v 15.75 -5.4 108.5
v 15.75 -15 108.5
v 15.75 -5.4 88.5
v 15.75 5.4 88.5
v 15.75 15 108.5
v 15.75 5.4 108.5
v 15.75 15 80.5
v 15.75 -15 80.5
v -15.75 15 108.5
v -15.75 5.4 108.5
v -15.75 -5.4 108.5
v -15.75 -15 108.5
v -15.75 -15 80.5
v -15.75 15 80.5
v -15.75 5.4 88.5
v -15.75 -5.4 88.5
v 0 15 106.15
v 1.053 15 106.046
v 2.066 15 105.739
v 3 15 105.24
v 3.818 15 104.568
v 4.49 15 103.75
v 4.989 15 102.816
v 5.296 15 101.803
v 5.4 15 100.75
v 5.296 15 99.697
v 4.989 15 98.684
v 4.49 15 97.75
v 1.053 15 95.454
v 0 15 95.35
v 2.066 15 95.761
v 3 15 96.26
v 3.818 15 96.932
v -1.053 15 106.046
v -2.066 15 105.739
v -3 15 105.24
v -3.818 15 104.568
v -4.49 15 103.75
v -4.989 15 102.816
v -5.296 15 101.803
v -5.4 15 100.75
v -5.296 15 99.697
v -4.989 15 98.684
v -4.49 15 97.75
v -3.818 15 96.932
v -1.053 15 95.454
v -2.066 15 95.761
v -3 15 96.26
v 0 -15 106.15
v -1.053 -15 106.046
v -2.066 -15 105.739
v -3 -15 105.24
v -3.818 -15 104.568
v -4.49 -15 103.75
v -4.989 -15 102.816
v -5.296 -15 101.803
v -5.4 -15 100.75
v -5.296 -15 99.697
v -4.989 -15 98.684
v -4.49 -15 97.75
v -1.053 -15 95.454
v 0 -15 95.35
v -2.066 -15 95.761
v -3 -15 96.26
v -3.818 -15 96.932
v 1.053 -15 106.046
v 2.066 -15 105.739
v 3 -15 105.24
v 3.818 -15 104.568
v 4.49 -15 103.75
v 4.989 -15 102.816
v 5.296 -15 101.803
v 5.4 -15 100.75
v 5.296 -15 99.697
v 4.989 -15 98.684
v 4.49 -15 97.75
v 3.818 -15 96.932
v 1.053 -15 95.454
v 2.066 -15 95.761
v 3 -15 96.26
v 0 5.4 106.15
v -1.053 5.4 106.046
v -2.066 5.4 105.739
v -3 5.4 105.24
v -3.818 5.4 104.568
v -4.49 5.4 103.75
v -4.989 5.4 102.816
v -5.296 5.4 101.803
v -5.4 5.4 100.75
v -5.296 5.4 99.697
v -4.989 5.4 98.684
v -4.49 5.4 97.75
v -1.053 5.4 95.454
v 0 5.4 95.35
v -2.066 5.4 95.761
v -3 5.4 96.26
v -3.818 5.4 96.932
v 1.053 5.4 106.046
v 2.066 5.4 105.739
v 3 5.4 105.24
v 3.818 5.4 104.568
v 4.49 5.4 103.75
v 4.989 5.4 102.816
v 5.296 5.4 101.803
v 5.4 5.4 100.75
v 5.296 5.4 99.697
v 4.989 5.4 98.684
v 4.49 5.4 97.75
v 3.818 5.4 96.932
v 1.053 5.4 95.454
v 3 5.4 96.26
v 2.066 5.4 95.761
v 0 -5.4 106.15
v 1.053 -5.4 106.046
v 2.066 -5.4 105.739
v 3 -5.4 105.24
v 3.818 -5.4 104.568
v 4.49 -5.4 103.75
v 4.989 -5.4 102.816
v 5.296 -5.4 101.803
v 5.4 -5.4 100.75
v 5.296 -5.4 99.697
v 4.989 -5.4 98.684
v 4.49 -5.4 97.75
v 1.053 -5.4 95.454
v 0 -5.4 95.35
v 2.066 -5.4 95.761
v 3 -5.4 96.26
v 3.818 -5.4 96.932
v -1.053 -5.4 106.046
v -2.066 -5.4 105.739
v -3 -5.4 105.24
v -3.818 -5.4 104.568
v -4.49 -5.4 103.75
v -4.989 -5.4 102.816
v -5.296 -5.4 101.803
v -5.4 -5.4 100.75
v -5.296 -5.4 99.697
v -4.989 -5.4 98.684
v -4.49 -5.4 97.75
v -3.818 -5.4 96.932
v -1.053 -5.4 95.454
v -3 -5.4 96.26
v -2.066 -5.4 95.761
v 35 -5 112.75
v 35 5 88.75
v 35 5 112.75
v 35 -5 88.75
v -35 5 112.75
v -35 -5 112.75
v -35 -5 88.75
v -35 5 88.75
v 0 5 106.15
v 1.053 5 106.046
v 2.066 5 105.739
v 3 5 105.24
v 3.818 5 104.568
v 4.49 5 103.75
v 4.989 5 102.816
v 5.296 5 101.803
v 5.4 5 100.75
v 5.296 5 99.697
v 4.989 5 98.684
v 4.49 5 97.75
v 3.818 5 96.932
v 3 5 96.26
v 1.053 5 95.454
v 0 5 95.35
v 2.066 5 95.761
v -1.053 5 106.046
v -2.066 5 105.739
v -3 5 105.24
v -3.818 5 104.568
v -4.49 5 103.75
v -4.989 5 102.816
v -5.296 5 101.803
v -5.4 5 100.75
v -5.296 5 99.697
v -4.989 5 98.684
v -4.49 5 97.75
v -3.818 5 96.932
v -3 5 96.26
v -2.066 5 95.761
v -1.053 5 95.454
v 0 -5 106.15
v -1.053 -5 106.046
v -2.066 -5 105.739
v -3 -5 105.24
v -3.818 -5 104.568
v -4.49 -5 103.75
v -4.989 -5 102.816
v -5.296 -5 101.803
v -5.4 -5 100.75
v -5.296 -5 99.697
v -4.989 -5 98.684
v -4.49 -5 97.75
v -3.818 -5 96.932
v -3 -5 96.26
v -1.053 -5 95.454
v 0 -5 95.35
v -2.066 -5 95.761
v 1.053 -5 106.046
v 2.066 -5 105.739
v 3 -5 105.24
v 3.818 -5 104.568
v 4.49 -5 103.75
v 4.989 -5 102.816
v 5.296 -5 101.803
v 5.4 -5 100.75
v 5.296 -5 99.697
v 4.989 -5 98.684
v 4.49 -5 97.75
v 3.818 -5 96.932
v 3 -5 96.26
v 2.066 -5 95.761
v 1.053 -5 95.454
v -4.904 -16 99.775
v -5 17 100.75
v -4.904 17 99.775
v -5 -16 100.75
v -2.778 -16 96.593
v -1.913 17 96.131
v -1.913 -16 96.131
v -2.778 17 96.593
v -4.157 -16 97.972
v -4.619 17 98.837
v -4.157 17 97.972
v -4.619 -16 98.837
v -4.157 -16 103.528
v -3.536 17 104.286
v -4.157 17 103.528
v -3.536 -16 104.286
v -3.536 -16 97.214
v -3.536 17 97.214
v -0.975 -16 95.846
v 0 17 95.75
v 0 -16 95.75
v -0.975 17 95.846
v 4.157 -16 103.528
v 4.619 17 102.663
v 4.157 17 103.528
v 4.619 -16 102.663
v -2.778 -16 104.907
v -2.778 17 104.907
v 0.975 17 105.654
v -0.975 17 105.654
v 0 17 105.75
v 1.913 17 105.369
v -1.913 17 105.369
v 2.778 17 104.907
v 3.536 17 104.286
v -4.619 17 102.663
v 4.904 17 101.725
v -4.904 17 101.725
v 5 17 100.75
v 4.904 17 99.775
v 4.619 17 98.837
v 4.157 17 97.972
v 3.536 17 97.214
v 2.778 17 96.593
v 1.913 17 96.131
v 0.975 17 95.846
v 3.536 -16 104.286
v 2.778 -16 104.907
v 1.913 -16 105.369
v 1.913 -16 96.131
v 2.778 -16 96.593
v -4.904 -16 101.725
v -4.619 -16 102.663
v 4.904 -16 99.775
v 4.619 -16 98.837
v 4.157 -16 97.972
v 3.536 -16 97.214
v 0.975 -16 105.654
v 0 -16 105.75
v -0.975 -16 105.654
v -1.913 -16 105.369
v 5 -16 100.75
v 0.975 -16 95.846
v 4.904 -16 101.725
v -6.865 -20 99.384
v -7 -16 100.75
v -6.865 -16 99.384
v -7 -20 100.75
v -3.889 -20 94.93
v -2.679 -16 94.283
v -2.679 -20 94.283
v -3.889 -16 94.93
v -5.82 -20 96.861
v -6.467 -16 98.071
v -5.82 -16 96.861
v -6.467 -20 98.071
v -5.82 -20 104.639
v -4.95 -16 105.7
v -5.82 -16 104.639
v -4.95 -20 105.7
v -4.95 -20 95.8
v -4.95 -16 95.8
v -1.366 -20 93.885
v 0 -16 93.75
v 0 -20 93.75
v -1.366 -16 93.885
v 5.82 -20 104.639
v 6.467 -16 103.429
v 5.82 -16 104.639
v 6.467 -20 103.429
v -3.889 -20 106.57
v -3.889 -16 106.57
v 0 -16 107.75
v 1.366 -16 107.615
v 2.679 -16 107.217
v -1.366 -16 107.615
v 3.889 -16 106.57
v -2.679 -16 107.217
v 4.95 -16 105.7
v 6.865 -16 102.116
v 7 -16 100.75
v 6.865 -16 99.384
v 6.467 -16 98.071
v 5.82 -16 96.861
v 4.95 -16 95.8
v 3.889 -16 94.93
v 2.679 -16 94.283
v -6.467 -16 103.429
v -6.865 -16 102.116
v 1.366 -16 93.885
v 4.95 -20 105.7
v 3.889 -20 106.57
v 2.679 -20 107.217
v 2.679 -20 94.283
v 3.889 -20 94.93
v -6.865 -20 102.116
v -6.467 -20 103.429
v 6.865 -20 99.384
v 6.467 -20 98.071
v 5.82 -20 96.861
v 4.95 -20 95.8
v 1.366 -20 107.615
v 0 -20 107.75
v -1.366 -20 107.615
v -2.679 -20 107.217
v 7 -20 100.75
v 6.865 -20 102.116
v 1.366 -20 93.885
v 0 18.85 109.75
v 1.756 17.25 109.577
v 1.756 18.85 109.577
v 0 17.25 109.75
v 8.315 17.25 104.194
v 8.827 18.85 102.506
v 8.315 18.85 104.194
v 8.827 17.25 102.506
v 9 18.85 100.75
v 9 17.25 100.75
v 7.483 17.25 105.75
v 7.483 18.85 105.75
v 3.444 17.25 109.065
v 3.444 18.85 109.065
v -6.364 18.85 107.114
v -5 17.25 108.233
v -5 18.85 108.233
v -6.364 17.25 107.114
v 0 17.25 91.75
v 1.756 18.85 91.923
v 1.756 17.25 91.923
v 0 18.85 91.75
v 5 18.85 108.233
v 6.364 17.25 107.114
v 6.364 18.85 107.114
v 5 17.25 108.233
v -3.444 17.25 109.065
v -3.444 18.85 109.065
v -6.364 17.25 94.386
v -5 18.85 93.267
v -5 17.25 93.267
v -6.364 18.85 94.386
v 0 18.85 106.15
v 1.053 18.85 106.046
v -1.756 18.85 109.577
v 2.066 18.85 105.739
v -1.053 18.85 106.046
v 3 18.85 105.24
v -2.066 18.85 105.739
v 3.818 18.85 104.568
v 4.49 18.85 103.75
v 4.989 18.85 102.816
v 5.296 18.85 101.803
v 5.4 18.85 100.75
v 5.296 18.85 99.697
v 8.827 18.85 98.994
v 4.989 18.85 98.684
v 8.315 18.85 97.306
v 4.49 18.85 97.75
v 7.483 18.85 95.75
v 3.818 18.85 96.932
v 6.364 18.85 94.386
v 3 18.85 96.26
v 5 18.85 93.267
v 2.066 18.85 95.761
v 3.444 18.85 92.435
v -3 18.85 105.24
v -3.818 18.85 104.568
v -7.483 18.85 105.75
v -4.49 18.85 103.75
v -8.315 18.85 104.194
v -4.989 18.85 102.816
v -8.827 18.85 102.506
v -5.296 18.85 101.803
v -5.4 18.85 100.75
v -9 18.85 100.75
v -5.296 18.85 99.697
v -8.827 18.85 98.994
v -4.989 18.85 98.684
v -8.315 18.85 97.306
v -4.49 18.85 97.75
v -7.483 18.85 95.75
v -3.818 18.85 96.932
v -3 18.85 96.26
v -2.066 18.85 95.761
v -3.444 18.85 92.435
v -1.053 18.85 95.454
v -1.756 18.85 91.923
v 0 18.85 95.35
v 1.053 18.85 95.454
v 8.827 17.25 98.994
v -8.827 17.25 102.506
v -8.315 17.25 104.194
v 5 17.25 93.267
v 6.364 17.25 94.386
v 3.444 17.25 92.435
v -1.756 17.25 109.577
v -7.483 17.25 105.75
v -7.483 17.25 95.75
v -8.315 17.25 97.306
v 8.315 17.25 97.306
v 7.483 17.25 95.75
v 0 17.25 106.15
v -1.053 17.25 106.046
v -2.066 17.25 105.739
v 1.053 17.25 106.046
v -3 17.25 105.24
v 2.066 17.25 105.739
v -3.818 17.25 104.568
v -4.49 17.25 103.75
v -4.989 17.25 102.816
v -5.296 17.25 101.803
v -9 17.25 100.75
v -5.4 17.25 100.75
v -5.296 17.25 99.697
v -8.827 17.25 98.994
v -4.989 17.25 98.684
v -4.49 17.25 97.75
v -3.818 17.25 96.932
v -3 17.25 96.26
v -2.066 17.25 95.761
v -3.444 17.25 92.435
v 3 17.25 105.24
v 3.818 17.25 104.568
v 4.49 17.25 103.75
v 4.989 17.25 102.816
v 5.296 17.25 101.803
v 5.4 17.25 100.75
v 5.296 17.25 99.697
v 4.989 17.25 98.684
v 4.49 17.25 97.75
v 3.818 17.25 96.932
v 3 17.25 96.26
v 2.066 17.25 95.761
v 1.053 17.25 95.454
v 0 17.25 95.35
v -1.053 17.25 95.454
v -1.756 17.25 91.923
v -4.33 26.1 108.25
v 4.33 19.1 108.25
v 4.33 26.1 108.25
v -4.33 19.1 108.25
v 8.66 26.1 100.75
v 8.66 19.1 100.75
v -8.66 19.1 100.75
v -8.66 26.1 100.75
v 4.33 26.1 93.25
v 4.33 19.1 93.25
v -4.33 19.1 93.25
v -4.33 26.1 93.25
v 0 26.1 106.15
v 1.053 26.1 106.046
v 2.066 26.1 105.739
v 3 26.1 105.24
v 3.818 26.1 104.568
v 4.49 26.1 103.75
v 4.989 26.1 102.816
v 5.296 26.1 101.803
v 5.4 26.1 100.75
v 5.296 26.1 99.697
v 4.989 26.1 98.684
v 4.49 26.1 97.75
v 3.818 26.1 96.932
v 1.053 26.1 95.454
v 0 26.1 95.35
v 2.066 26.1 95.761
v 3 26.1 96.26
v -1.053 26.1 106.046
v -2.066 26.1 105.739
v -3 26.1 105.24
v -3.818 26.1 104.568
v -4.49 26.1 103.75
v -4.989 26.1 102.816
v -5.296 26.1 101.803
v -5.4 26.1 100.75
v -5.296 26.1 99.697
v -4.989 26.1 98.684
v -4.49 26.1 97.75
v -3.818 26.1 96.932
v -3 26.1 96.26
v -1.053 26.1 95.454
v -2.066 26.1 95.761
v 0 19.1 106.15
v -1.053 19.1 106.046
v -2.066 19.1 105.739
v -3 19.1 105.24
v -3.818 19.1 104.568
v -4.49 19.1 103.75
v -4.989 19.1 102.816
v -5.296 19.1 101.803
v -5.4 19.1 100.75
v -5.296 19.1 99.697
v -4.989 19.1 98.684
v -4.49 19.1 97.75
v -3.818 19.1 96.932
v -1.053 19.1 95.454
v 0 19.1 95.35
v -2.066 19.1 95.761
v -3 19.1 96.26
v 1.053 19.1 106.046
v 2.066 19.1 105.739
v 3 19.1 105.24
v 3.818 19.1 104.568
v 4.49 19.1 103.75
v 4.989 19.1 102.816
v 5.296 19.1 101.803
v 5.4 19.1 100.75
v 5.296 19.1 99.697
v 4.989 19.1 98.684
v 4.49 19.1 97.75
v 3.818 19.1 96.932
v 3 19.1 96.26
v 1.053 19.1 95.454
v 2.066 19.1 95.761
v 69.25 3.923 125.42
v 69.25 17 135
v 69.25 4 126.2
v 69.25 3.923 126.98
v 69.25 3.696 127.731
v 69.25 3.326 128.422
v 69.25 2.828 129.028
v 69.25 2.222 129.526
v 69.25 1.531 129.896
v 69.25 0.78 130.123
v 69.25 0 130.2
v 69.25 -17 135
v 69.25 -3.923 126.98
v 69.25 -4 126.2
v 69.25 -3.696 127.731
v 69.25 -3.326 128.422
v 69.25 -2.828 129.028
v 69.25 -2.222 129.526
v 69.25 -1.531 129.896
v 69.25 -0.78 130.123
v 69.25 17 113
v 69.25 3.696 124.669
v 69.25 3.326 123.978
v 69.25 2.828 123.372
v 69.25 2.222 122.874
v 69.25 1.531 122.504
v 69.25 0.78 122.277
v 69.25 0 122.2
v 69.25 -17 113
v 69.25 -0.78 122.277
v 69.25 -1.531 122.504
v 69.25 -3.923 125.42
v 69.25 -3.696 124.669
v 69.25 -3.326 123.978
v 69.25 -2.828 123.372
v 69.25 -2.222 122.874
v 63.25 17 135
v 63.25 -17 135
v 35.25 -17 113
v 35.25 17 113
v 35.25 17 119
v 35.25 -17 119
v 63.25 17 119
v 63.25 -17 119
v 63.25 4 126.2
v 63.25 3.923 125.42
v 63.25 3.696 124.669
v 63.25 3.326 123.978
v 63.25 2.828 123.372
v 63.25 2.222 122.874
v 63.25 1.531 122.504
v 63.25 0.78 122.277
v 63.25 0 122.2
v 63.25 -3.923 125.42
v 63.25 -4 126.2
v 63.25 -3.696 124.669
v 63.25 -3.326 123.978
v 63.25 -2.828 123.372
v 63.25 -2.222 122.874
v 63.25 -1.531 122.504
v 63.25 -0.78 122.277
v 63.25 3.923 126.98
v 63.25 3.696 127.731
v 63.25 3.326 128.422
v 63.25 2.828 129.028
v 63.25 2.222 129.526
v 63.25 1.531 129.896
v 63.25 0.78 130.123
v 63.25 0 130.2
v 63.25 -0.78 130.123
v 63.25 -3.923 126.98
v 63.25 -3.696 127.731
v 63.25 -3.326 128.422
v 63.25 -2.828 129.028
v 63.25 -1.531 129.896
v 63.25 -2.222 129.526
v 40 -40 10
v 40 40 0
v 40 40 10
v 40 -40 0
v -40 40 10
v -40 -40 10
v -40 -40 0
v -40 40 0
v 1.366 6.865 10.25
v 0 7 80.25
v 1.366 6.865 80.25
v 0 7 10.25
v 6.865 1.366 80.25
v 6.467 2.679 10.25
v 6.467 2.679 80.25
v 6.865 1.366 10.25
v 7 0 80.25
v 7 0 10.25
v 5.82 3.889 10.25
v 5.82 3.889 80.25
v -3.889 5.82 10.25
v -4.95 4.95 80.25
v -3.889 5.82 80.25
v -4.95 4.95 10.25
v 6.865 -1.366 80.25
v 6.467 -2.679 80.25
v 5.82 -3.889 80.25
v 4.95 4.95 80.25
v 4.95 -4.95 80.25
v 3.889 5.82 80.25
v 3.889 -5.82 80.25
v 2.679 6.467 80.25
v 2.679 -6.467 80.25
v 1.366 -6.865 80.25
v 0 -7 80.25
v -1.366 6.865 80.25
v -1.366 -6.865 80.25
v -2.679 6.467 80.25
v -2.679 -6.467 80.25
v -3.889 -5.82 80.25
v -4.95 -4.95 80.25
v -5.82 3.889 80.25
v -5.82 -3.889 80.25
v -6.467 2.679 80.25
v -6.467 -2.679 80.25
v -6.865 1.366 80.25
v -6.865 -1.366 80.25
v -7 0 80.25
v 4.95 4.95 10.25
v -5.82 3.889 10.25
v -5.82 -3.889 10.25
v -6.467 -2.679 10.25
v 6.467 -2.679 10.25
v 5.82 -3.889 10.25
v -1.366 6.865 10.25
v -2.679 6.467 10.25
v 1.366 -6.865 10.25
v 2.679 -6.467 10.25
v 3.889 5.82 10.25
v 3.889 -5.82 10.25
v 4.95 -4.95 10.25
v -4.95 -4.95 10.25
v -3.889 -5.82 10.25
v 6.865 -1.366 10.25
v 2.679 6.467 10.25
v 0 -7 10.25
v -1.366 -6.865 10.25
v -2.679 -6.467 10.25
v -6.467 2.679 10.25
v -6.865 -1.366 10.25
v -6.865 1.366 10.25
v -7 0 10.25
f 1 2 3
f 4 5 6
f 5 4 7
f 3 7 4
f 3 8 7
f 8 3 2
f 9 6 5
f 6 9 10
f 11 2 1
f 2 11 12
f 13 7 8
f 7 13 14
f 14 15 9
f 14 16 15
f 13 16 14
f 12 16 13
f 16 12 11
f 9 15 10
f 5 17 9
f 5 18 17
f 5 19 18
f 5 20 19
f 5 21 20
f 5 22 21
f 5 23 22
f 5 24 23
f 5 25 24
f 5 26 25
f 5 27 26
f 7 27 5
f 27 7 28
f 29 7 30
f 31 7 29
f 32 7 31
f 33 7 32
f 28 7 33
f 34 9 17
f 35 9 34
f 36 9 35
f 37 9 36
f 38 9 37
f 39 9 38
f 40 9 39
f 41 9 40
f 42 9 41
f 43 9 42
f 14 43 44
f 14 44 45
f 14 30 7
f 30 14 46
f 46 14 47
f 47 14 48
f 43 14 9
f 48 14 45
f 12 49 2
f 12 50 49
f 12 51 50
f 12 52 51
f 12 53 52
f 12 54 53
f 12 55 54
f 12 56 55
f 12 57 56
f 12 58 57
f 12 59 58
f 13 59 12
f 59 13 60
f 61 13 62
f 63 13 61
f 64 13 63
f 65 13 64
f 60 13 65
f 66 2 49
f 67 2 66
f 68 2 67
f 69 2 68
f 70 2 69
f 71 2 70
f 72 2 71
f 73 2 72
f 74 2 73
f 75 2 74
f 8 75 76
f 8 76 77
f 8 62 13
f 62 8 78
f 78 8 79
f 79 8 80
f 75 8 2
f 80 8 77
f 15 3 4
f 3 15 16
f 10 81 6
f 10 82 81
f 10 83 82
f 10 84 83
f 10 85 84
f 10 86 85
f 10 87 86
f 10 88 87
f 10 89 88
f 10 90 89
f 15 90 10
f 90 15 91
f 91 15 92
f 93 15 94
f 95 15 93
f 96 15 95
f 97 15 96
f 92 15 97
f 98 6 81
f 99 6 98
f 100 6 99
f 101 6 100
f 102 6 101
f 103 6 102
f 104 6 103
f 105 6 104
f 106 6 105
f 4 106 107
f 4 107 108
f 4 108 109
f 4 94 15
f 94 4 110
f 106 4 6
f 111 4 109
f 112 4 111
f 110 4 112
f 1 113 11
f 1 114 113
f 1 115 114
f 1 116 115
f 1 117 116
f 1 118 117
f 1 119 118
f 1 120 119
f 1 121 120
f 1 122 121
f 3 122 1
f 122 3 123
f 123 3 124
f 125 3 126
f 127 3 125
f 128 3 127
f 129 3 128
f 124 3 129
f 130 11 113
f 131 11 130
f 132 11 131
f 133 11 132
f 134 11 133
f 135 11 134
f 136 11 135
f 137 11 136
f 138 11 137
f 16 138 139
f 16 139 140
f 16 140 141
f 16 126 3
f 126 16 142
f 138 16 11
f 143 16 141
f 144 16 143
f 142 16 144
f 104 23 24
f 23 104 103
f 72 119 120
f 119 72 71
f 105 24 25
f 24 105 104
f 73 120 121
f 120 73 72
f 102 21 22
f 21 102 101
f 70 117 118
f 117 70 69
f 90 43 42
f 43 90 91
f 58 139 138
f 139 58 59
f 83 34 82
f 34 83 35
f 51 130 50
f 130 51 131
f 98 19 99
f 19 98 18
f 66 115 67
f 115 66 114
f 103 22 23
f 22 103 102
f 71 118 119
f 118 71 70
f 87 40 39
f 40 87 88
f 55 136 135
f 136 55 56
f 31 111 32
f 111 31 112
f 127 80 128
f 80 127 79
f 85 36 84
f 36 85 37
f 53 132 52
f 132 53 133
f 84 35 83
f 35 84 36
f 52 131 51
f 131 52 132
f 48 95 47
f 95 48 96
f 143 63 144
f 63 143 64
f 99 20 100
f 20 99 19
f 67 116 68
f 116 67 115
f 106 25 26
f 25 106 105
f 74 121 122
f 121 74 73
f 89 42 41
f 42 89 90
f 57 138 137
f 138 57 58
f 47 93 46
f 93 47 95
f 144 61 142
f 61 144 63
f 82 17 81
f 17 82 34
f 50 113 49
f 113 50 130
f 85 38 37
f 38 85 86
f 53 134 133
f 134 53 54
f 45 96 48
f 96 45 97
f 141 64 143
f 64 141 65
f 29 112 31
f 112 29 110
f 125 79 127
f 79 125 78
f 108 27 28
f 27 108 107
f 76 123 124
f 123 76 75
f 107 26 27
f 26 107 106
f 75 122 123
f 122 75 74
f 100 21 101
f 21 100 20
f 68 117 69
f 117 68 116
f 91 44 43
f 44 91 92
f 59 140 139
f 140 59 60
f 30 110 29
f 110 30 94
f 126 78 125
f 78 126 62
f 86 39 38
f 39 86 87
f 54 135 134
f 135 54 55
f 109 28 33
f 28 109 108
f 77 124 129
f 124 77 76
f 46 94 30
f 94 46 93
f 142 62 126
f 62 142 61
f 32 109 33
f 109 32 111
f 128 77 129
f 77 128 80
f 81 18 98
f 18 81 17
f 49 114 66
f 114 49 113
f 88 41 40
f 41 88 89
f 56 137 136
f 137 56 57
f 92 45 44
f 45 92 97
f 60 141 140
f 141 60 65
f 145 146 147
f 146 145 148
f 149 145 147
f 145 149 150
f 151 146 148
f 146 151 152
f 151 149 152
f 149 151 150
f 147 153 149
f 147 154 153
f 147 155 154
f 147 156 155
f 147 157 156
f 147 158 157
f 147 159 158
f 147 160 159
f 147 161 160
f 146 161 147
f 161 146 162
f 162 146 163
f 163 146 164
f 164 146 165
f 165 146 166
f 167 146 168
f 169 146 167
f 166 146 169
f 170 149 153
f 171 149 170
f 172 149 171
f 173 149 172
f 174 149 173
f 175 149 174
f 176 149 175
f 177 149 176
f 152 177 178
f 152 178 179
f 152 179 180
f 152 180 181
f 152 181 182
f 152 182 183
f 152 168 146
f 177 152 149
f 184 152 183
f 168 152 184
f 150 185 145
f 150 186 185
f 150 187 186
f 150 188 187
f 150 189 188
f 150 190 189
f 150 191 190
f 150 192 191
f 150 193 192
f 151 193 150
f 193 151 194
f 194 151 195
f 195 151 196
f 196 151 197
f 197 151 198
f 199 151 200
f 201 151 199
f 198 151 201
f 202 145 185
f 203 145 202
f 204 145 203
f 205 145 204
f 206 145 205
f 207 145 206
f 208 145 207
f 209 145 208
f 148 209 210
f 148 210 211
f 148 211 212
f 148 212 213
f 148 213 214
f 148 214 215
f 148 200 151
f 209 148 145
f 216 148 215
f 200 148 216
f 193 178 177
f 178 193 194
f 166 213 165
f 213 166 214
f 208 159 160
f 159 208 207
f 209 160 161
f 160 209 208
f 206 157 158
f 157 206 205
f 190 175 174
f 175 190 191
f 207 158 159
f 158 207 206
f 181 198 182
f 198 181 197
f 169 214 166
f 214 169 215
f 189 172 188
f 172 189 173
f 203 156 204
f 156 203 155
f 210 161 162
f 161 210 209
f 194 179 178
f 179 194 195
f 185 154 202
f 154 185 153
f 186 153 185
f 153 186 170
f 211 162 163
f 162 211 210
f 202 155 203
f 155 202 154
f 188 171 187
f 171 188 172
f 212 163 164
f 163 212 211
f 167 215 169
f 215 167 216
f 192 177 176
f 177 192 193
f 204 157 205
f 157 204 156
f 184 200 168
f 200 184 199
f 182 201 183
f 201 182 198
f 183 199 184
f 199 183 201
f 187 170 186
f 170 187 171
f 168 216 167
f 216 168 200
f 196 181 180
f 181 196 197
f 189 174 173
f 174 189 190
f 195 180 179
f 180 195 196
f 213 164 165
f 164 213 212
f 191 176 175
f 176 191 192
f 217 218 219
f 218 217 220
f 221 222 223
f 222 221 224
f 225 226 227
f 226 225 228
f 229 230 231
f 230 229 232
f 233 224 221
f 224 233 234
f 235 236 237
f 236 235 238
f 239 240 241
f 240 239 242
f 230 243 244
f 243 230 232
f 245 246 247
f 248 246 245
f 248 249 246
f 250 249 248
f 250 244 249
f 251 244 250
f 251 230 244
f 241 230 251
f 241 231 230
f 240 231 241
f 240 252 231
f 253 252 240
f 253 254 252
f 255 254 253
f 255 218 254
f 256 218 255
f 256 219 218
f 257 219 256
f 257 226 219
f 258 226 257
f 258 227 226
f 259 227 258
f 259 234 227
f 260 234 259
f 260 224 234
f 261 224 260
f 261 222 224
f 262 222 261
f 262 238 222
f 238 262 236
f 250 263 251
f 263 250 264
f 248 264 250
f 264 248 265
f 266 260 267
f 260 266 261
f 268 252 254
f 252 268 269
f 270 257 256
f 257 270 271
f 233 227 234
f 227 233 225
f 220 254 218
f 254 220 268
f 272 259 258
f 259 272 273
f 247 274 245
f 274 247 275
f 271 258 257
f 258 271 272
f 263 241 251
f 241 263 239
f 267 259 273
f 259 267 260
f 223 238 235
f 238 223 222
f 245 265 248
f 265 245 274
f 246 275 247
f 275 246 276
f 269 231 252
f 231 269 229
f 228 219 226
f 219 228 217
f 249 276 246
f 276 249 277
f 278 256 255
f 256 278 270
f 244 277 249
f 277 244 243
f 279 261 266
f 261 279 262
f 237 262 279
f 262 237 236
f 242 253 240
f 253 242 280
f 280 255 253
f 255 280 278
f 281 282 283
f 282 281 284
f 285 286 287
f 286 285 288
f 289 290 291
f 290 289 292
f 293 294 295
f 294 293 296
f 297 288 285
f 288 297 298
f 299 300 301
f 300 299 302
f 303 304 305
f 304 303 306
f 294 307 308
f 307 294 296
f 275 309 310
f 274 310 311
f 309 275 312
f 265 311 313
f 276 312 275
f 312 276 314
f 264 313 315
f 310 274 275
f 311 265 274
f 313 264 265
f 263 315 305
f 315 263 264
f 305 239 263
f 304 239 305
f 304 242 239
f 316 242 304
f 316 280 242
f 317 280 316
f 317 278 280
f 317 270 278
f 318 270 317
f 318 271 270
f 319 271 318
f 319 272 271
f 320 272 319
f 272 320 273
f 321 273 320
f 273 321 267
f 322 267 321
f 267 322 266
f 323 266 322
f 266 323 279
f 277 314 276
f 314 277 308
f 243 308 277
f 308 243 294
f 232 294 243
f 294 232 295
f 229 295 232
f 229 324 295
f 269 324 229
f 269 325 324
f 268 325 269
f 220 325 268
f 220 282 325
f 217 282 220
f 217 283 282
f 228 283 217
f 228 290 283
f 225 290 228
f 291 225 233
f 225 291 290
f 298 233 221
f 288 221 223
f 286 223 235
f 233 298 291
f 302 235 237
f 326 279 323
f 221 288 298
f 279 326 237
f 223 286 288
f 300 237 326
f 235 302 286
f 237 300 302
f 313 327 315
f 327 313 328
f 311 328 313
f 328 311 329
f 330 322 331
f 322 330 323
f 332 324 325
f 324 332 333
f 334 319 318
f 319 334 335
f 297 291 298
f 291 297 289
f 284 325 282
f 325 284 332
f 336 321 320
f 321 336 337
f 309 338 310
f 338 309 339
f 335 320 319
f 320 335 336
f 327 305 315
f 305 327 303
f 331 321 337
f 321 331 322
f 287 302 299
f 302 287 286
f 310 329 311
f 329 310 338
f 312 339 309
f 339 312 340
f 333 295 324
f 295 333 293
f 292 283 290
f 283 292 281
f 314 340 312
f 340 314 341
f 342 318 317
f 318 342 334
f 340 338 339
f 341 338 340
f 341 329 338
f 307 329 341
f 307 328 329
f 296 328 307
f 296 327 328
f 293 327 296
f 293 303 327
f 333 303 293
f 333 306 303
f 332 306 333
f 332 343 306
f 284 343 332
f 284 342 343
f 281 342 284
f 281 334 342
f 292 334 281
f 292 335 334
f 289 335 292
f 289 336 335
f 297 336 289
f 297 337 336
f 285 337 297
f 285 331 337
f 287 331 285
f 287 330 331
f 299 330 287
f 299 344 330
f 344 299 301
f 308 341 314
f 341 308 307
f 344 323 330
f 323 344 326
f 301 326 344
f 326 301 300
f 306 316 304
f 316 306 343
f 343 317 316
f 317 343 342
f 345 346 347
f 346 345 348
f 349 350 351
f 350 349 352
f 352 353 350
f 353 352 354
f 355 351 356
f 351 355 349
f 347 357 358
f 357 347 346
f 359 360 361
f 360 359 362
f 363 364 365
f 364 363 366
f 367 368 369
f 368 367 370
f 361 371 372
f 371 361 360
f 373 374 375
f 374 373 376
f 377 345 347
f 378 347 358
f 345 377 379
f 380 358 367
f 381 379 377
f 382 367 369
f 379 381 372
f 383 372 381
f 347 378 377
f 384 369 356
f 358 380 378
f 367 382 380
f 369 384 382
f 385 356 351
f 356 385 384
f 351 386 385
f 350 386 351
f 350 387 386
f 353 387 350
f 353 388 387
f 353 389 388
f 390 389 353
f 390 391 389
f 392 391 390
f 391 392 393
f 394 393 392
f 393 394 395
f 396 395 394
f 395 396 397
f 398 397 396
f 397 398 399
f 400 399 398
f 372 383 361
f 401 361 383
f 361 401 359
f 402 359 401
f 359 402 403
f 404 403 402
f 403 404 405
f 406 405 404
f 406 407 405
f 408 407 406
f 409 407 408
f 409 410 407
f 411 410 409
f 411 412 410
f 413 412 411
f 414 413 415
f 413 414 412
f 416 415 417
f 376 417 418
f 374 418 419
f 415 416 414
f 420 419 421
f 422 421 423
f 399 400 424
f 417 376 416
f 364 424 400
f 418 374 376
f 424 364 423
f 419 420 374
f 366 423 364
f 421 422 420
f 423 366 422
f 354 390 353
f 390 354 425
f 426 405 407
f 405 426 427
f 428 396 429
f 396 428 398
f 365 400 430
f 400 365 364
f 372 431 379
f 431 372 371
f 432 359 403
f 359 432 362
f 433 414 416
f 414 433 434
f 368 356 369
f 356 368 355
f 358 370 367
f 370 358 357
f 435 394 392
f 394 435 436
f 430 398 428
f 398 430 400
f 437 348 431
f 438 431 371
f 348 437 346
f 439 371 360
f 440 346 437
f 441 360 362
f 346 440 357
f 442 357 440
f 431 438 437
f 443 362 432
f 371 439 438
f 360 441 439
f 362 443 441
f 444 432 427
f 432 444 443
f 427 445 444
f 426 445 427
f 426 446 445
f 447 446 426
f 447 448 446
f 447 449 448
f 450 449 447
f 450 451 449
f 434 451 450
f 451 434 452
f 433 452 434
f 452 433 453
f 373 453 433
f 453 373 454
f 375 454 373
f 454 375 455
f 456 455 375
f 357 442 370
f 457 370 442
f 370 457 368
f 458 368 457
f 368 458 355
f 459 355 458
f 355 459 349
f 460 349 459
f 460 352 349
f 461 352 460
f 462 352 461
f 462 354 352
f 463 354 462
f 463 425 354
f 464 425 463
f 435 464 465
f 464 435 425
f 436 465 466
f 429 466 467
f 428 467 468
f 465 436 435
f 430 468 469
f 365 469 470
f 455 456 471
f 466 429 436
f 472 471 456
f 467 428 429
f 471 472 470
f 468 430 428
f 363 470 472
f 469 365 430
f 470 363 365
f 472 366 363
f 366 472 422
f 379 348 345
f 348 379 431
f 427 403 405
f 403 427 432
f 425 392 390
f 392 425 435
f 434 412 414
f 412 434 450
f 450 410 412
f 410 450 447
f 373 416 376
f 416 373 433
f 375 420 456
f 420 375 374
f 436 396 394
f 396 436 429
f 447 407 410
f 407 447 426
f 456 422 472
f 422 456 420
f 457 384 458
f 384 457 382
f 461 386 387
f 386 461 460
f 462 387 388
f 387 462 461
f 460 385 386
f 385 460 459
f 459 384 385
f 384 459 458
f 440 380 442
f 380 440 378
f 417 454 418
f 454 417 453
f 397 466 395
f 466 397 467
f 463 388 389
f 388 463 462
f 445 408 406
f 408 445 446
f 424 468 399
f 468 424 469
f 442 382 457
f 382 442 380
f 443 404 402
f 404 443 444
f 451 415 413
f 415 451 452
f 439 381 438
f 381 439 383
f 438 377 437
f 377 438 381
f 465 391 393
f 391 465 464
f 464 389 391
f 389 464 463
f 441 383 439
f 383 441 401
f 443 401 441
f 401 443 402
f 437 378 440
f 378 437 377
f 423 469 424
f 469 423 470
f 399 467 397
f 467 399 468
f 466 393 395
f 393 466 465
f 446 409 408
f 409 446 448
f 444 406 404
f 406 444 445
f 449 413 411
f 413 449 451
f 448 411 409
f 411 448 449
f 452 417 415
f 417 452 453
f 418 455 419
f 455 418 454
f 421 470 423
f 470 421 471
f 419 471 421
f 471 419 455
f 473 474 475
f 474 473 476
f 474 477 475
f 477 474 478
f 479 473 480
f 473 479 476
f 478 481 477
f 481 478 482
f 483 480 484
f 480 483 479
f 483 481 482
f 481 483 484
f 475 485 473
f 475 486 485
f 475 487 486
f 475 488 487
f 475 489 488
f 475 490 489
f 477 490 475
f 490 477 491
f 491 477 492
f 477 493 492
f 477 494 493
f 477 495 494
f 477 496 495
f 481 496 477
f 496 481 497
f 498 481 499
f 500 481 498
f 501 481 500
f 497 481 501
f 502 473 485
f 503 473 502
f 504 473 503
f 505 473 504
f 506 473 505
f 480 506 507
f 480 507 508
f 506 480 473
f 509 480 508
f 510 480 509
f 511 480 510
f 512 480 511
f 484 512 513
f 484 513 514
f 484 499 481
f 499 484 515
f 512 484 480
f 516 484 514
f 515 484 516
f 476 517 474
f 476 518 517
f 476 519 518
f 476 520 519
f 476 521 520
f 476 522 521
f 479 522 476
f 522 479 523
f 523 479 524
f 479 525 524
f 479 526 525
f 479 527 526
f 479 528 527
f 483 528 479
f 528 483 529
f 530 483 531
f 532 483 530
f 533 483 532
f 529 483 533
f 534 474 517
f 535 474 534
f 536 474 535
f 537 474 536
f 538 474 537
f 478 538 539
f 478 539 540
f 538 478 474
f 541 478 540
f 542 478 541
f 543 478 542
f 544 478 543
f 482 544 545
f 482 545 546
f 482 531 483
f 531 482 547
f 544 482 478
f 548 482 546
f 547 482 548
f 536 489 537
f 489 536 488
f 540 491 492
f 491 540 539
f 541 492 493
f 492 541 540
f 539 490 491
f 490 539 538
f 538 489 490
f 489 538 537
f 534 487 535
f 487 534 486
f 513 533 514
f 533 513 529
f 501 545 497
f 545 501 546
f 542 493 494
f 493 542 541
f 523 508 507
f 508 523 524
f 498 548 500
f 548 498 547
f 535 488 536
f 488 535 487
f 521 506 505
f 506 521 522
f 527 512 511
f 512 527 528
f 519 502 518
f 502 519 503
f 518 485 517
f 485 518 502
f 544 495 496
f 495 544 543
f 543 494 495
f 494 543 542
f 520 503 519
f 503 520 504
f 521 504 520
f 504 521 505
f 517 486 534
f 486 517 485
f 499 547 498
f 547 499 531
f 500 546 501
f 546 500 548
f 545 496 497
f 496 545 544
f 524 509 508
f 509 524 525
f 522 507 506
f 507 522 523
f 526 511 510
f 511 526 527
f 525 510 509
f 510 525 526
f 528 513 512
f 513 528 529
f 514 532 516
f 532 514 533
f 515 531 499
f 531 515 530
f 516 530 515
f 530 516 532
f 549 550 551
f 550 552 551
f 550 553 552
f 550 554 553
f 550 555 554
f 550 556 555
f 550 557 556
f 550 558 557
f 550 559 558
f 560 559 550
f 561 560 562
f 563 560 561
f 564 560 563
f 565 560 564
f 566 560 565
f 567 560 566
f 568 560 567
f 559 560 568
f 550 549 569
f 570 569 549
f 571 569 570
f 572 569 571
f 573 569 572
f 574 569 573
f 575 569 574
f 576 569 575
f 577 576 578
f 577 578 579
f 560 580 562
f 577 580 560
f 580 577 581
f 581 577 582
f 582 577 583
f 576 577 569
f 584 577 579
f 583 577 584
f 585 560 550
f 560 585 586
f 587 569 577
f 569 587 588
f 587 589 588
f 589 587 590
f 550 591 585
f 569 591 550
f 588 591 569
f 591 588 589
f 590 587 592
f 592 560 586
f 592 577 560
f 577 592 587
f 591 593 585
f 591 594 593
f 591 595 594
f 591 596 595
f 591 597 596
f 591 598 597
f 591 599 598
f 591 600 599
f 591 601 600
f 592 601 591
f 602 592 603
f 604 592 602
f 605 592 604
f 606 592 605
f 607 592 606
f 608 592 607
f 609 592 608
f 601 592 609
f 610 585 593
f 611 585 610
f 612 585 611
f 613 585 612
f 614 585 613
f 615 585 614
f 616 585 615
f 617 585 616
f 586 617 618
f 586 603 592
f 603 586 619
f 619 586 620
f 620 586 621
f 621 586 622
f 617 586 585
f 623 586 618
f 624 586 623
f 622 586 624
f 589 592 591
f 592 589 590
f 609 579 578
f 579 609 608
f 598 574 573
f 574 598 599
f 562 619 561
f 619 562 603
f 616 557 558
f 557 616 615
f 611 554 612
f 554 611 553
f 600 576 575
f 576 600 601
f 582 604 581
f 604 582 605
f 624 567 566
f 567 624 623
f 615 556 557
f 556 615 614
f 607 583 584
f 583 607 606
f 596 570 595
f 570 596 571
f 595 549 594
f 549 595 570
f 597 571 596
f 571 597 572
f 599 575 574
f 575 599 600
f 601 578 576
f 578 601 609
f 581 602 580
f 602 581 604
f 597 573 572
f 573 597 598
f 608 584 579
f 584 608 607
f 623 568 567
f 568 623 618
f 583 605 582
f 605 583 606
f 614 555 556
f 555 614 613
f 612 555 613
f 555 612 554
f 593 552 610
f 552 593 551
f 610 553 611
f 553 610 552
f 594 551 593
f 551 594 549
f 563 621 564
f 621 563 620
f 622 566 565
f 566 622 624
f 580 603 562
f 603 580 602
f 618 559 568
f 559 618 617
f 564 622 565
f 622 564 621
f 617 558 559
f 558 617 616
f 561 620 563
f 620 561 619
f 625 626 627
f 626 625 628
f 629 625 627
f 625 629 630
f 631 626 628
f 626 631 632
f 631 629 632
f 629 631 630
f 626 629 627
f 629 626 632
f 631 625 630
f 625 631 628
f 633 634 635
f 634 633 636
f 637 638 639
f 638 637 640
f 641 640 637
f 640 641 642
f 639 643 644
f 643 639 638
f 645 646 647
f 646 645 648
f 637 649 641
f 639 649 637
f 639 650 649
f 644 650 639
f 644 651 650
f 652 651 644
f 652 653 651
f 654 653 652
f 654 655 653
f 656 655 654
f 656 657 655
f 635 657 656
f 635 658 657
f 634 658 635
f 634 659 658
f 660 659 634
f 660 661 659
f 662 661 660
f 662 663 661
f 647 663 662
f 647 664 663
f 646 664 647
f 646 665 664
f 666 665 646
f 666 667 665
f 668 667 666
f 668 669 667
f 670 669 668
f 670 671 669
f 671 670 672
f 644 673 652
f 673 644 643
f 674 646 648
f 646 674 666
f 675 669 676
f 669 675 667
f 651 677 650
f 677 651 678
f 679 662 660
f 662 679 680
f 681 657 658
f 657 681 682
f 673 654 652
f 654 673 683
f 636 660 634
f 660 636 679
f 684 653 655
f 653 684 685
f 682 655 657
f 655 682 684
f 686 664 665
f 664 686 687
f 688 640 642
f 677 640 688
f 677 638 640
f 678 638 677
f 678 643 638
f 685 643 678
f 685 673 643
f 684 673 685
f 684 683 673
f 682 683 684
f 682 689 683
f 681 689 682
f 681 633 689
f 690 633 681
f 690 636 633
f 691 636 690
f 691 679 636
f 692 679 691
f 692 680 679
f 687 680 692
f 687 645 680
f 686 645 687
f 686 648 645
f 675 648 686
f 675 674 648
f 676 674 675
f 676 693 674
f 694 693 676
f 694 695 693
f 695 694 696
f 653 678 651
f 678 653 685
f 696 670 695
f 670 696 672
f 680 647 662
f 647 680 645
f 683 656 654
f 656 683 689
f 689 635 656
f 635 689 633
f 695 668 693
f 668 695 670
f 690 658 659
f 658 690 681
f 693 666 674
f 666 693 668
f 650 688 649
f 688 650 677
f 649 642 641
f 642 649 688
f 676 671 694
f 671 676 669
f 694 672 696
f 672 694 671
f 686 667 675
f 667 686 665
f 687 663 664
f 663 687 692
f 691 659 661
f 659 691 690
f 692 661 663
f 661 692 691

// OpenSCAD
$fn = 32;

// ------------------------------------------------------------------------
// Lamp arm: column d14 x 70 mm, arm 70 mm
// Every part is its own module, assembly() places every instance.
// ------------------------------------------------------------------------

// --- part 1 ---
module lamp_base() {
  difference() {
    translate([-40, -40, 0]) cube([80, 80, 10]);
  }
}

// --- part 2 ---
module lamp_column() {
  cylinder(h = 70, d = 14);
}

// --- part 3 ---
module head_fork() {
  difference() {
    translate([-15.75, -15, 0]) cube([31.5, 30, 28]);
    translate([-16.75, -5.4, 8]) cube([33.5, 10.8, 21]);
    translate([0, 0, 20.25]) rotate([90, 0, 0]) cylinder(h = 32, d = 10.8, center = true);
  }
}

// --- part 4 ---
module lamp_arm() {
  difference() {
    translate([-35, -5, 0]) cube([70, 10, 24]);
    translate([0, 0, 12]) rotate([90, 0, 0]) cylinder(h = 12, d = 10.8, center = true);
  }
}

// --- part 5 ---
module arm_pin() {
  rotate([0, 90, 0]) cylinder(h = 34, d = 10, center = true);
  translate([-20, 0, 0]) rotate([0, 90, 0]) cylinder(h = 4, d = 14);
}

// --- part 6 ---
module arm_washer() {
  difference() {
      translate([0, 0, 0]) cylinder(h = 1.6, d = 18);
      translate([0, 0, -1]) cylinder(h = 3.6, d = 10.8);
    }
}

// --- part 7 ---
module arm_nut() {
  difference() {
    linear_extrude(height = 7) polygon(points = [[8.66, 0], [4.33, 7.5], [-4.33, 7.5], [-8.66, 0], [-4.33, -7.5], [4.33, -7.5]]);
    translate([0, 0, -1]) cylinder(h = 9, d = 10.8);
  }
}

// --- part 8 ---
module shade_bracket() {
  difference() {
    translate([-17, -17, 0]) cube([34, 34, 22]);
    translate([-18, -18, 6]) cube([29, 36, 17]);
    translate([14, 0, 13.2]) rotate([0, 90, 0]) cylinder(h = 8, d = 8, center = true);
  }
}

// --- assembly ---
module assembly() {
  color([0.80, 0.24, 0.20]) translate([0, 0, 0]) rotate([0, 0, 0]) lamp_base();
  color([0.20, 0.45, 0.75]) translate([0, 0, 10.25]) rotate([0, 0, 0]) lamp_column();
  color([0.25, 0.62, 0.32]) translate([0, 0, 80.5]) rotate([0, 0, 0]) head_fork();
  color([0.92, 0.70, 0.18]) translate([0, 0, 88.75]) rotate([0, 0, 0]) lamp_arm();
  color([0.58, 0.35, 0.70]) translate([0, 0, 100.75]) rotate([0, 0, 90]) arm_pin();
  color([0.16, 0.66, 0.66]) translate([0, 18.85, 100.75]) rotate([90, 0, 0]) arm_washer();
  color([0.85, 0.48, 0.18]) translate([0, 26.1, 100.75]) rotate([90, 0, 0]) arm_nut();
  color([0.55, 0.60, 0.65]) translate([52.25, 0, 113]) rotate([0, 0, 0]) shade_bracket();
}

assembly();
